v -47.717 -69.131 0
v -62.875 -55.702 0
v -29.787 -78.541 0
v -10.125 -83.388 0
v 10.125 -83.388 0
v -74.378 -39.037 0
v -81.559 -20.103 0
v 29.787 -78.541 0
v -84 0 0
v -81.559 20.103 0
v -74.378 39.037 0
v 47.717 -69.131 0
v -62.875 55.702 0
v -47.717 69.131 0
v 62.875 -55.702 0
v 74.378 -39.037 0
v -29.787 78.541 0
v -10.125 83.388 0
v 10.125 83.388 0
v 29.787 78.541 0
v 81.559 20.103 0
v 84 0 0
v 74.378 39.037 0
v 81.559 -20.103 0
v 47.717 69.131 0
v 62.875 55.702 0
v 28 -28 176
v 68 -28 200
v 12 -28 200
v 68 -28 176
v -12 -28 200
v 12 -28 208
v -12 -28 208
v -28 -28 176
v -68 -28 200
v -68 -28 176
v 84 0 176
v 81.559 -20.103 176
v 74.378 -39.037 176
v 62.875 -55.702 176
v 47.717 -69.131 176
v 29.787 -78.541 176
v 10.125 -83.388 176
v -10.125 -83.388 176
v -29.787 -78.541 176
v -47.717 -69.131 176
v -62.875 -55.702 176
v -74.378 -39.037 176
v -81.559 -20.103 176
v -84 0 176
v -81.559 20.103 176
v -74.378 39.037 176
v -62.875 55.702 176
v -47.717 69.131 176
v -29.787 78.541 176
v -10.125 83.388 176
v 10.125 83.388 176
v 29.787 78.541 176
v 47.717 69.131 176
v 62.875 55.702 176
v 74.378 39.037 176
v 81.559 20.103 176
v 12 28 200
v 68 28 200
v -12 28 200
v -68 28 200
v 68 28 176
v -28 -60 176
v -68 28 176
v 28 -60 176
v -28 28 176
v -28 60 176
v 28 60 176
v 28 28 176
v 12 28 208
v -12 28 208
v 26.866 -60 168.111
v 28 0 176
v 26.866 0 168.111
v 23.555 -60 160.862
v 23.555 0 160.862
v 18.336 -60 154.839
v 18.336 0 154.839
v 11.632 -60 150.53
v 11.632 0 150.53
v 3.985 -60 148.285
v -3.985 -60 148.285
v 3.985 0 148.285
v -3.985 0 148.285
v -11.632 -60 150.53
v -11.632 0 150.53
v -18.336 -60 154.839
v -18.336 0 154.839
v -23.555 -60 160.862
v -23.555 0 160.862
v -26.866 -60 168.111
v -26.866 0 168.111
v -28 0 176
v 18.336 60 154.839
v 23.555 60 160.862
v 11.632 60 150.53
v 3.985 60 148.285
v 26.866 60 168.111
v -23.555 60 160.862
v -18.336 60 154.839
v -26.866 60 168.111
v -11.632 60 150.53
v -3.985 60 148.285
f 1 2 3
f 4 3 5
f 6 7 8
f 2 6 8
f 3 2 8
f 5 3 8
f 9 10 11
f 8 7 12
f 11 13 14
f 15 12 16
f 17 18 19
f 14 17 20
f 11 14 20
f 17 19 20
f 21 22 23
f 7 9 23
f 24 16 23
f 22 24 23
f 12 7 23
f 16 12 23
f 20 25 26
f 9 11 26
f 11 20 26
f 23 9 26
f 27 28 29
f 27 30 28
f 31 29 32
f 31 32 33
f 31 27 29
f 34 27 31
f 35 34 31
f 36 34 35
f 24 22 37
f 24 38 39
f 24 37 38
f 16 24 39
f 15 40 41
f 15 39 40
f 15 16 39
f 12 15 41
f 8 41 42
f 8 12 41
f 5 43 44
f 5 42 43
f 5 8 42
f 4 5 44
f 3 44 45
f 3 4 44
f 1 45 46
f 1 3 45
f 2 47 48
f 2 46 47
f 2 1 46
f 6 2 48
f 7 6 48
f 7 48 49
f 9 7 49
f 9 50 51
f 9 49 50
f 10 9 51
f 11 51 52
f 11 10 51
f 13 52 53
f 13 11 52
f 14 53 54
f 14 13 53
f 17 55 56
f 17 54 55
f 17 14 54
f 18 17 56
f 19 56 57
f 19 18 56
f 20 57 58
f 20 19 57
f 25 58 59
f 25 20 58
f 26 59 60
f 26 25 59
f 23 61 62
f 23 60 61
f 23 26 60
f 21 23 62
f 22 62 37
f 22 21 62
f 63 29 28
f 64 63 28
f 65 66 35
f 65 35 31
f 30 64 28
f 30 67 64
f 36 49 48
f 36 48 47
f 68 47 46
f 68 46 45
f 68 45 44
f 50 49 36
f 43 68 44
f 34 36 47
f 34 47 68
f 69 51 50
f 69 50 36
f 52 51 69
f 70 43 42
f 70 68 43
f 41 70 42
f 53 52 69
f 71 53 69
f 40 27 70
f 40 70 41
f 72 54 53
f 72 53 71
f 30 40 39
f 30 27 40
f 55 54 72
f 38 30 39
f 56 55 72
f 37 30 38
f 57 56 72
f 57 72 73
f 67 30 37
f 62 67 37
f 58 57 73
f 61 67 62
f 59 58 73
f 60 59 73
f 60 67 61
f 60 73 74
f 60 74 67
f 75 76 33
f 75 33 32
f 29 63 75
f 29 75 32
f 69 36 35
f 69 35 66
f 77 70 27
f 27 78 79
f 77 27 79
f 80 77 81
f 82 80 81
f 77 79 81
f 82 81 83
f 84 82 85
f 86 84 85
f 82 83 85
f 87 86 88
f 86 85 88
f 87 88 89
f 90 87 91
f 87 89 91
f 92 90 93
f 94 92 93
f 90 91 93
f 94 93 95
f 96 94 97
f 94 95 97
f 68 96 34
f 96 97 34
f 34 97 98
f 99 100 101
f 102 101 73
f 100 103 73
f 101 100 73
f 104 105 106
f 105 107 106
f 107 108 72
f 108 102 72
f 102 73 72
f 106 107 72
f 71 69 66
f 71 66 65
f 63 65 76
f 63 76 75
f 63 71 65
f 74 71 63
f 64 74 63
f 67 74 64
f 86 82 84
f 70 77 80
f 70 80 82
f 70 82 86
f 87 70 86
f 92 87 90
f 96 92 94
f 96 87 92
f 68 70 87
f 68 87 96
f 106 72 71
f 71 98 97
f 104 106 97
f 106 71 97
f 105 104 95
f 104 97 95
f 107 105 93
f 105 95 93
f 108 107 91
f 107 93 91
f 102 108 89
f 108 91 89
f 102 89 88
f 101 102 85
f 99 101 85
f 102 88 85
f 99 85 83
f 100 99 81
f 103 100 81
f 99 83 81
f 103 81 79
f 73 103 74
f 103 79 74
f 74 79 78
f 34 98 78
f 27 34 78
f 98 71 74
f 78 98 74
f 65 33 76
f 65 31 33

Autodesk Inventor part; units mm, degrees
ref_plane "YZ Plane" through (0, 0, 0) normal (1, 0, 0) x (0, 1, 0)
ref_plane "XZ Plane" through (0, 0, 0) normal (0, 1, 0) x (-1, 0, 0)
ref_plane "XY Plane" through (0, 0, 0) normal (0, 0, 1) x (1, 0, 0)
sketch "Sketch1" plane through (0, 0, 0) normal (0, 0, 1) x (1, 0, 0)
  circle A0 centre (0, 0) radius 84
  dimension "d0" = 168
extrude "Extrusion1" add sketch "Sketch1" along normal blind 176
sketch "Sketch2" plane through (0, 0, 0) normal (0, 1, 0) x (-1, 0, 0)
  line L0 (84, 176) -> (-84, 176) projected
  circle A0 centre (0, 176) radius 28
  point P0 (0, 0)
  dimension "d3" = 56
extrude "Extrusion2" cut sketch "Sketch2" along normal mid plane 120
sketch "Sketch4" plane through (0, 0, 176) normal (0, 0, 1) x (1, 0, 0)
  line L0 (68, -28) -> (-68, -28)
  line L1 (-68, -28) -> (-68, 28)
  line L2 (-68, 28) -> (68, 28)
  line L3 (68, 28) -> (68, -28)
  line L4 (68, -28) -> (-68, 28) construction
  line L5 (-68, -28) -> (68, 28) construction
  circle A0 centre (0, 0) radius 84 projected
  dimension "d7" = 56
  dimension "d8" = 16
extrude "Extrusion3" add sketch "Sketch4" along normal blind 24 contours L0 L1 L2 L3
sketch "Sketch5" plane through (0, 0, 200) normal (0, 0, 1) x (1, 0, 0)
  line L0 (28, -28) -> (-28, -28) projected
  line L1 (-12, 28) -> (12, 28)
  line L2 (12, 28) -> (12, -28)
  line L3 (12, -28) -> (-12, -28)
  line L4 (-12, -28) -> (-12, 28)
  line L5 (-12, 28) -> (12, -28) construction
  line L6 (12, 28) -> (-12, -28) construction
  point P0 (0, 0)
  dimension "d11" = 24
extrude "Extrusion4" add sketch "Sketch5" along normal blind 8
properties part number "link_1"
